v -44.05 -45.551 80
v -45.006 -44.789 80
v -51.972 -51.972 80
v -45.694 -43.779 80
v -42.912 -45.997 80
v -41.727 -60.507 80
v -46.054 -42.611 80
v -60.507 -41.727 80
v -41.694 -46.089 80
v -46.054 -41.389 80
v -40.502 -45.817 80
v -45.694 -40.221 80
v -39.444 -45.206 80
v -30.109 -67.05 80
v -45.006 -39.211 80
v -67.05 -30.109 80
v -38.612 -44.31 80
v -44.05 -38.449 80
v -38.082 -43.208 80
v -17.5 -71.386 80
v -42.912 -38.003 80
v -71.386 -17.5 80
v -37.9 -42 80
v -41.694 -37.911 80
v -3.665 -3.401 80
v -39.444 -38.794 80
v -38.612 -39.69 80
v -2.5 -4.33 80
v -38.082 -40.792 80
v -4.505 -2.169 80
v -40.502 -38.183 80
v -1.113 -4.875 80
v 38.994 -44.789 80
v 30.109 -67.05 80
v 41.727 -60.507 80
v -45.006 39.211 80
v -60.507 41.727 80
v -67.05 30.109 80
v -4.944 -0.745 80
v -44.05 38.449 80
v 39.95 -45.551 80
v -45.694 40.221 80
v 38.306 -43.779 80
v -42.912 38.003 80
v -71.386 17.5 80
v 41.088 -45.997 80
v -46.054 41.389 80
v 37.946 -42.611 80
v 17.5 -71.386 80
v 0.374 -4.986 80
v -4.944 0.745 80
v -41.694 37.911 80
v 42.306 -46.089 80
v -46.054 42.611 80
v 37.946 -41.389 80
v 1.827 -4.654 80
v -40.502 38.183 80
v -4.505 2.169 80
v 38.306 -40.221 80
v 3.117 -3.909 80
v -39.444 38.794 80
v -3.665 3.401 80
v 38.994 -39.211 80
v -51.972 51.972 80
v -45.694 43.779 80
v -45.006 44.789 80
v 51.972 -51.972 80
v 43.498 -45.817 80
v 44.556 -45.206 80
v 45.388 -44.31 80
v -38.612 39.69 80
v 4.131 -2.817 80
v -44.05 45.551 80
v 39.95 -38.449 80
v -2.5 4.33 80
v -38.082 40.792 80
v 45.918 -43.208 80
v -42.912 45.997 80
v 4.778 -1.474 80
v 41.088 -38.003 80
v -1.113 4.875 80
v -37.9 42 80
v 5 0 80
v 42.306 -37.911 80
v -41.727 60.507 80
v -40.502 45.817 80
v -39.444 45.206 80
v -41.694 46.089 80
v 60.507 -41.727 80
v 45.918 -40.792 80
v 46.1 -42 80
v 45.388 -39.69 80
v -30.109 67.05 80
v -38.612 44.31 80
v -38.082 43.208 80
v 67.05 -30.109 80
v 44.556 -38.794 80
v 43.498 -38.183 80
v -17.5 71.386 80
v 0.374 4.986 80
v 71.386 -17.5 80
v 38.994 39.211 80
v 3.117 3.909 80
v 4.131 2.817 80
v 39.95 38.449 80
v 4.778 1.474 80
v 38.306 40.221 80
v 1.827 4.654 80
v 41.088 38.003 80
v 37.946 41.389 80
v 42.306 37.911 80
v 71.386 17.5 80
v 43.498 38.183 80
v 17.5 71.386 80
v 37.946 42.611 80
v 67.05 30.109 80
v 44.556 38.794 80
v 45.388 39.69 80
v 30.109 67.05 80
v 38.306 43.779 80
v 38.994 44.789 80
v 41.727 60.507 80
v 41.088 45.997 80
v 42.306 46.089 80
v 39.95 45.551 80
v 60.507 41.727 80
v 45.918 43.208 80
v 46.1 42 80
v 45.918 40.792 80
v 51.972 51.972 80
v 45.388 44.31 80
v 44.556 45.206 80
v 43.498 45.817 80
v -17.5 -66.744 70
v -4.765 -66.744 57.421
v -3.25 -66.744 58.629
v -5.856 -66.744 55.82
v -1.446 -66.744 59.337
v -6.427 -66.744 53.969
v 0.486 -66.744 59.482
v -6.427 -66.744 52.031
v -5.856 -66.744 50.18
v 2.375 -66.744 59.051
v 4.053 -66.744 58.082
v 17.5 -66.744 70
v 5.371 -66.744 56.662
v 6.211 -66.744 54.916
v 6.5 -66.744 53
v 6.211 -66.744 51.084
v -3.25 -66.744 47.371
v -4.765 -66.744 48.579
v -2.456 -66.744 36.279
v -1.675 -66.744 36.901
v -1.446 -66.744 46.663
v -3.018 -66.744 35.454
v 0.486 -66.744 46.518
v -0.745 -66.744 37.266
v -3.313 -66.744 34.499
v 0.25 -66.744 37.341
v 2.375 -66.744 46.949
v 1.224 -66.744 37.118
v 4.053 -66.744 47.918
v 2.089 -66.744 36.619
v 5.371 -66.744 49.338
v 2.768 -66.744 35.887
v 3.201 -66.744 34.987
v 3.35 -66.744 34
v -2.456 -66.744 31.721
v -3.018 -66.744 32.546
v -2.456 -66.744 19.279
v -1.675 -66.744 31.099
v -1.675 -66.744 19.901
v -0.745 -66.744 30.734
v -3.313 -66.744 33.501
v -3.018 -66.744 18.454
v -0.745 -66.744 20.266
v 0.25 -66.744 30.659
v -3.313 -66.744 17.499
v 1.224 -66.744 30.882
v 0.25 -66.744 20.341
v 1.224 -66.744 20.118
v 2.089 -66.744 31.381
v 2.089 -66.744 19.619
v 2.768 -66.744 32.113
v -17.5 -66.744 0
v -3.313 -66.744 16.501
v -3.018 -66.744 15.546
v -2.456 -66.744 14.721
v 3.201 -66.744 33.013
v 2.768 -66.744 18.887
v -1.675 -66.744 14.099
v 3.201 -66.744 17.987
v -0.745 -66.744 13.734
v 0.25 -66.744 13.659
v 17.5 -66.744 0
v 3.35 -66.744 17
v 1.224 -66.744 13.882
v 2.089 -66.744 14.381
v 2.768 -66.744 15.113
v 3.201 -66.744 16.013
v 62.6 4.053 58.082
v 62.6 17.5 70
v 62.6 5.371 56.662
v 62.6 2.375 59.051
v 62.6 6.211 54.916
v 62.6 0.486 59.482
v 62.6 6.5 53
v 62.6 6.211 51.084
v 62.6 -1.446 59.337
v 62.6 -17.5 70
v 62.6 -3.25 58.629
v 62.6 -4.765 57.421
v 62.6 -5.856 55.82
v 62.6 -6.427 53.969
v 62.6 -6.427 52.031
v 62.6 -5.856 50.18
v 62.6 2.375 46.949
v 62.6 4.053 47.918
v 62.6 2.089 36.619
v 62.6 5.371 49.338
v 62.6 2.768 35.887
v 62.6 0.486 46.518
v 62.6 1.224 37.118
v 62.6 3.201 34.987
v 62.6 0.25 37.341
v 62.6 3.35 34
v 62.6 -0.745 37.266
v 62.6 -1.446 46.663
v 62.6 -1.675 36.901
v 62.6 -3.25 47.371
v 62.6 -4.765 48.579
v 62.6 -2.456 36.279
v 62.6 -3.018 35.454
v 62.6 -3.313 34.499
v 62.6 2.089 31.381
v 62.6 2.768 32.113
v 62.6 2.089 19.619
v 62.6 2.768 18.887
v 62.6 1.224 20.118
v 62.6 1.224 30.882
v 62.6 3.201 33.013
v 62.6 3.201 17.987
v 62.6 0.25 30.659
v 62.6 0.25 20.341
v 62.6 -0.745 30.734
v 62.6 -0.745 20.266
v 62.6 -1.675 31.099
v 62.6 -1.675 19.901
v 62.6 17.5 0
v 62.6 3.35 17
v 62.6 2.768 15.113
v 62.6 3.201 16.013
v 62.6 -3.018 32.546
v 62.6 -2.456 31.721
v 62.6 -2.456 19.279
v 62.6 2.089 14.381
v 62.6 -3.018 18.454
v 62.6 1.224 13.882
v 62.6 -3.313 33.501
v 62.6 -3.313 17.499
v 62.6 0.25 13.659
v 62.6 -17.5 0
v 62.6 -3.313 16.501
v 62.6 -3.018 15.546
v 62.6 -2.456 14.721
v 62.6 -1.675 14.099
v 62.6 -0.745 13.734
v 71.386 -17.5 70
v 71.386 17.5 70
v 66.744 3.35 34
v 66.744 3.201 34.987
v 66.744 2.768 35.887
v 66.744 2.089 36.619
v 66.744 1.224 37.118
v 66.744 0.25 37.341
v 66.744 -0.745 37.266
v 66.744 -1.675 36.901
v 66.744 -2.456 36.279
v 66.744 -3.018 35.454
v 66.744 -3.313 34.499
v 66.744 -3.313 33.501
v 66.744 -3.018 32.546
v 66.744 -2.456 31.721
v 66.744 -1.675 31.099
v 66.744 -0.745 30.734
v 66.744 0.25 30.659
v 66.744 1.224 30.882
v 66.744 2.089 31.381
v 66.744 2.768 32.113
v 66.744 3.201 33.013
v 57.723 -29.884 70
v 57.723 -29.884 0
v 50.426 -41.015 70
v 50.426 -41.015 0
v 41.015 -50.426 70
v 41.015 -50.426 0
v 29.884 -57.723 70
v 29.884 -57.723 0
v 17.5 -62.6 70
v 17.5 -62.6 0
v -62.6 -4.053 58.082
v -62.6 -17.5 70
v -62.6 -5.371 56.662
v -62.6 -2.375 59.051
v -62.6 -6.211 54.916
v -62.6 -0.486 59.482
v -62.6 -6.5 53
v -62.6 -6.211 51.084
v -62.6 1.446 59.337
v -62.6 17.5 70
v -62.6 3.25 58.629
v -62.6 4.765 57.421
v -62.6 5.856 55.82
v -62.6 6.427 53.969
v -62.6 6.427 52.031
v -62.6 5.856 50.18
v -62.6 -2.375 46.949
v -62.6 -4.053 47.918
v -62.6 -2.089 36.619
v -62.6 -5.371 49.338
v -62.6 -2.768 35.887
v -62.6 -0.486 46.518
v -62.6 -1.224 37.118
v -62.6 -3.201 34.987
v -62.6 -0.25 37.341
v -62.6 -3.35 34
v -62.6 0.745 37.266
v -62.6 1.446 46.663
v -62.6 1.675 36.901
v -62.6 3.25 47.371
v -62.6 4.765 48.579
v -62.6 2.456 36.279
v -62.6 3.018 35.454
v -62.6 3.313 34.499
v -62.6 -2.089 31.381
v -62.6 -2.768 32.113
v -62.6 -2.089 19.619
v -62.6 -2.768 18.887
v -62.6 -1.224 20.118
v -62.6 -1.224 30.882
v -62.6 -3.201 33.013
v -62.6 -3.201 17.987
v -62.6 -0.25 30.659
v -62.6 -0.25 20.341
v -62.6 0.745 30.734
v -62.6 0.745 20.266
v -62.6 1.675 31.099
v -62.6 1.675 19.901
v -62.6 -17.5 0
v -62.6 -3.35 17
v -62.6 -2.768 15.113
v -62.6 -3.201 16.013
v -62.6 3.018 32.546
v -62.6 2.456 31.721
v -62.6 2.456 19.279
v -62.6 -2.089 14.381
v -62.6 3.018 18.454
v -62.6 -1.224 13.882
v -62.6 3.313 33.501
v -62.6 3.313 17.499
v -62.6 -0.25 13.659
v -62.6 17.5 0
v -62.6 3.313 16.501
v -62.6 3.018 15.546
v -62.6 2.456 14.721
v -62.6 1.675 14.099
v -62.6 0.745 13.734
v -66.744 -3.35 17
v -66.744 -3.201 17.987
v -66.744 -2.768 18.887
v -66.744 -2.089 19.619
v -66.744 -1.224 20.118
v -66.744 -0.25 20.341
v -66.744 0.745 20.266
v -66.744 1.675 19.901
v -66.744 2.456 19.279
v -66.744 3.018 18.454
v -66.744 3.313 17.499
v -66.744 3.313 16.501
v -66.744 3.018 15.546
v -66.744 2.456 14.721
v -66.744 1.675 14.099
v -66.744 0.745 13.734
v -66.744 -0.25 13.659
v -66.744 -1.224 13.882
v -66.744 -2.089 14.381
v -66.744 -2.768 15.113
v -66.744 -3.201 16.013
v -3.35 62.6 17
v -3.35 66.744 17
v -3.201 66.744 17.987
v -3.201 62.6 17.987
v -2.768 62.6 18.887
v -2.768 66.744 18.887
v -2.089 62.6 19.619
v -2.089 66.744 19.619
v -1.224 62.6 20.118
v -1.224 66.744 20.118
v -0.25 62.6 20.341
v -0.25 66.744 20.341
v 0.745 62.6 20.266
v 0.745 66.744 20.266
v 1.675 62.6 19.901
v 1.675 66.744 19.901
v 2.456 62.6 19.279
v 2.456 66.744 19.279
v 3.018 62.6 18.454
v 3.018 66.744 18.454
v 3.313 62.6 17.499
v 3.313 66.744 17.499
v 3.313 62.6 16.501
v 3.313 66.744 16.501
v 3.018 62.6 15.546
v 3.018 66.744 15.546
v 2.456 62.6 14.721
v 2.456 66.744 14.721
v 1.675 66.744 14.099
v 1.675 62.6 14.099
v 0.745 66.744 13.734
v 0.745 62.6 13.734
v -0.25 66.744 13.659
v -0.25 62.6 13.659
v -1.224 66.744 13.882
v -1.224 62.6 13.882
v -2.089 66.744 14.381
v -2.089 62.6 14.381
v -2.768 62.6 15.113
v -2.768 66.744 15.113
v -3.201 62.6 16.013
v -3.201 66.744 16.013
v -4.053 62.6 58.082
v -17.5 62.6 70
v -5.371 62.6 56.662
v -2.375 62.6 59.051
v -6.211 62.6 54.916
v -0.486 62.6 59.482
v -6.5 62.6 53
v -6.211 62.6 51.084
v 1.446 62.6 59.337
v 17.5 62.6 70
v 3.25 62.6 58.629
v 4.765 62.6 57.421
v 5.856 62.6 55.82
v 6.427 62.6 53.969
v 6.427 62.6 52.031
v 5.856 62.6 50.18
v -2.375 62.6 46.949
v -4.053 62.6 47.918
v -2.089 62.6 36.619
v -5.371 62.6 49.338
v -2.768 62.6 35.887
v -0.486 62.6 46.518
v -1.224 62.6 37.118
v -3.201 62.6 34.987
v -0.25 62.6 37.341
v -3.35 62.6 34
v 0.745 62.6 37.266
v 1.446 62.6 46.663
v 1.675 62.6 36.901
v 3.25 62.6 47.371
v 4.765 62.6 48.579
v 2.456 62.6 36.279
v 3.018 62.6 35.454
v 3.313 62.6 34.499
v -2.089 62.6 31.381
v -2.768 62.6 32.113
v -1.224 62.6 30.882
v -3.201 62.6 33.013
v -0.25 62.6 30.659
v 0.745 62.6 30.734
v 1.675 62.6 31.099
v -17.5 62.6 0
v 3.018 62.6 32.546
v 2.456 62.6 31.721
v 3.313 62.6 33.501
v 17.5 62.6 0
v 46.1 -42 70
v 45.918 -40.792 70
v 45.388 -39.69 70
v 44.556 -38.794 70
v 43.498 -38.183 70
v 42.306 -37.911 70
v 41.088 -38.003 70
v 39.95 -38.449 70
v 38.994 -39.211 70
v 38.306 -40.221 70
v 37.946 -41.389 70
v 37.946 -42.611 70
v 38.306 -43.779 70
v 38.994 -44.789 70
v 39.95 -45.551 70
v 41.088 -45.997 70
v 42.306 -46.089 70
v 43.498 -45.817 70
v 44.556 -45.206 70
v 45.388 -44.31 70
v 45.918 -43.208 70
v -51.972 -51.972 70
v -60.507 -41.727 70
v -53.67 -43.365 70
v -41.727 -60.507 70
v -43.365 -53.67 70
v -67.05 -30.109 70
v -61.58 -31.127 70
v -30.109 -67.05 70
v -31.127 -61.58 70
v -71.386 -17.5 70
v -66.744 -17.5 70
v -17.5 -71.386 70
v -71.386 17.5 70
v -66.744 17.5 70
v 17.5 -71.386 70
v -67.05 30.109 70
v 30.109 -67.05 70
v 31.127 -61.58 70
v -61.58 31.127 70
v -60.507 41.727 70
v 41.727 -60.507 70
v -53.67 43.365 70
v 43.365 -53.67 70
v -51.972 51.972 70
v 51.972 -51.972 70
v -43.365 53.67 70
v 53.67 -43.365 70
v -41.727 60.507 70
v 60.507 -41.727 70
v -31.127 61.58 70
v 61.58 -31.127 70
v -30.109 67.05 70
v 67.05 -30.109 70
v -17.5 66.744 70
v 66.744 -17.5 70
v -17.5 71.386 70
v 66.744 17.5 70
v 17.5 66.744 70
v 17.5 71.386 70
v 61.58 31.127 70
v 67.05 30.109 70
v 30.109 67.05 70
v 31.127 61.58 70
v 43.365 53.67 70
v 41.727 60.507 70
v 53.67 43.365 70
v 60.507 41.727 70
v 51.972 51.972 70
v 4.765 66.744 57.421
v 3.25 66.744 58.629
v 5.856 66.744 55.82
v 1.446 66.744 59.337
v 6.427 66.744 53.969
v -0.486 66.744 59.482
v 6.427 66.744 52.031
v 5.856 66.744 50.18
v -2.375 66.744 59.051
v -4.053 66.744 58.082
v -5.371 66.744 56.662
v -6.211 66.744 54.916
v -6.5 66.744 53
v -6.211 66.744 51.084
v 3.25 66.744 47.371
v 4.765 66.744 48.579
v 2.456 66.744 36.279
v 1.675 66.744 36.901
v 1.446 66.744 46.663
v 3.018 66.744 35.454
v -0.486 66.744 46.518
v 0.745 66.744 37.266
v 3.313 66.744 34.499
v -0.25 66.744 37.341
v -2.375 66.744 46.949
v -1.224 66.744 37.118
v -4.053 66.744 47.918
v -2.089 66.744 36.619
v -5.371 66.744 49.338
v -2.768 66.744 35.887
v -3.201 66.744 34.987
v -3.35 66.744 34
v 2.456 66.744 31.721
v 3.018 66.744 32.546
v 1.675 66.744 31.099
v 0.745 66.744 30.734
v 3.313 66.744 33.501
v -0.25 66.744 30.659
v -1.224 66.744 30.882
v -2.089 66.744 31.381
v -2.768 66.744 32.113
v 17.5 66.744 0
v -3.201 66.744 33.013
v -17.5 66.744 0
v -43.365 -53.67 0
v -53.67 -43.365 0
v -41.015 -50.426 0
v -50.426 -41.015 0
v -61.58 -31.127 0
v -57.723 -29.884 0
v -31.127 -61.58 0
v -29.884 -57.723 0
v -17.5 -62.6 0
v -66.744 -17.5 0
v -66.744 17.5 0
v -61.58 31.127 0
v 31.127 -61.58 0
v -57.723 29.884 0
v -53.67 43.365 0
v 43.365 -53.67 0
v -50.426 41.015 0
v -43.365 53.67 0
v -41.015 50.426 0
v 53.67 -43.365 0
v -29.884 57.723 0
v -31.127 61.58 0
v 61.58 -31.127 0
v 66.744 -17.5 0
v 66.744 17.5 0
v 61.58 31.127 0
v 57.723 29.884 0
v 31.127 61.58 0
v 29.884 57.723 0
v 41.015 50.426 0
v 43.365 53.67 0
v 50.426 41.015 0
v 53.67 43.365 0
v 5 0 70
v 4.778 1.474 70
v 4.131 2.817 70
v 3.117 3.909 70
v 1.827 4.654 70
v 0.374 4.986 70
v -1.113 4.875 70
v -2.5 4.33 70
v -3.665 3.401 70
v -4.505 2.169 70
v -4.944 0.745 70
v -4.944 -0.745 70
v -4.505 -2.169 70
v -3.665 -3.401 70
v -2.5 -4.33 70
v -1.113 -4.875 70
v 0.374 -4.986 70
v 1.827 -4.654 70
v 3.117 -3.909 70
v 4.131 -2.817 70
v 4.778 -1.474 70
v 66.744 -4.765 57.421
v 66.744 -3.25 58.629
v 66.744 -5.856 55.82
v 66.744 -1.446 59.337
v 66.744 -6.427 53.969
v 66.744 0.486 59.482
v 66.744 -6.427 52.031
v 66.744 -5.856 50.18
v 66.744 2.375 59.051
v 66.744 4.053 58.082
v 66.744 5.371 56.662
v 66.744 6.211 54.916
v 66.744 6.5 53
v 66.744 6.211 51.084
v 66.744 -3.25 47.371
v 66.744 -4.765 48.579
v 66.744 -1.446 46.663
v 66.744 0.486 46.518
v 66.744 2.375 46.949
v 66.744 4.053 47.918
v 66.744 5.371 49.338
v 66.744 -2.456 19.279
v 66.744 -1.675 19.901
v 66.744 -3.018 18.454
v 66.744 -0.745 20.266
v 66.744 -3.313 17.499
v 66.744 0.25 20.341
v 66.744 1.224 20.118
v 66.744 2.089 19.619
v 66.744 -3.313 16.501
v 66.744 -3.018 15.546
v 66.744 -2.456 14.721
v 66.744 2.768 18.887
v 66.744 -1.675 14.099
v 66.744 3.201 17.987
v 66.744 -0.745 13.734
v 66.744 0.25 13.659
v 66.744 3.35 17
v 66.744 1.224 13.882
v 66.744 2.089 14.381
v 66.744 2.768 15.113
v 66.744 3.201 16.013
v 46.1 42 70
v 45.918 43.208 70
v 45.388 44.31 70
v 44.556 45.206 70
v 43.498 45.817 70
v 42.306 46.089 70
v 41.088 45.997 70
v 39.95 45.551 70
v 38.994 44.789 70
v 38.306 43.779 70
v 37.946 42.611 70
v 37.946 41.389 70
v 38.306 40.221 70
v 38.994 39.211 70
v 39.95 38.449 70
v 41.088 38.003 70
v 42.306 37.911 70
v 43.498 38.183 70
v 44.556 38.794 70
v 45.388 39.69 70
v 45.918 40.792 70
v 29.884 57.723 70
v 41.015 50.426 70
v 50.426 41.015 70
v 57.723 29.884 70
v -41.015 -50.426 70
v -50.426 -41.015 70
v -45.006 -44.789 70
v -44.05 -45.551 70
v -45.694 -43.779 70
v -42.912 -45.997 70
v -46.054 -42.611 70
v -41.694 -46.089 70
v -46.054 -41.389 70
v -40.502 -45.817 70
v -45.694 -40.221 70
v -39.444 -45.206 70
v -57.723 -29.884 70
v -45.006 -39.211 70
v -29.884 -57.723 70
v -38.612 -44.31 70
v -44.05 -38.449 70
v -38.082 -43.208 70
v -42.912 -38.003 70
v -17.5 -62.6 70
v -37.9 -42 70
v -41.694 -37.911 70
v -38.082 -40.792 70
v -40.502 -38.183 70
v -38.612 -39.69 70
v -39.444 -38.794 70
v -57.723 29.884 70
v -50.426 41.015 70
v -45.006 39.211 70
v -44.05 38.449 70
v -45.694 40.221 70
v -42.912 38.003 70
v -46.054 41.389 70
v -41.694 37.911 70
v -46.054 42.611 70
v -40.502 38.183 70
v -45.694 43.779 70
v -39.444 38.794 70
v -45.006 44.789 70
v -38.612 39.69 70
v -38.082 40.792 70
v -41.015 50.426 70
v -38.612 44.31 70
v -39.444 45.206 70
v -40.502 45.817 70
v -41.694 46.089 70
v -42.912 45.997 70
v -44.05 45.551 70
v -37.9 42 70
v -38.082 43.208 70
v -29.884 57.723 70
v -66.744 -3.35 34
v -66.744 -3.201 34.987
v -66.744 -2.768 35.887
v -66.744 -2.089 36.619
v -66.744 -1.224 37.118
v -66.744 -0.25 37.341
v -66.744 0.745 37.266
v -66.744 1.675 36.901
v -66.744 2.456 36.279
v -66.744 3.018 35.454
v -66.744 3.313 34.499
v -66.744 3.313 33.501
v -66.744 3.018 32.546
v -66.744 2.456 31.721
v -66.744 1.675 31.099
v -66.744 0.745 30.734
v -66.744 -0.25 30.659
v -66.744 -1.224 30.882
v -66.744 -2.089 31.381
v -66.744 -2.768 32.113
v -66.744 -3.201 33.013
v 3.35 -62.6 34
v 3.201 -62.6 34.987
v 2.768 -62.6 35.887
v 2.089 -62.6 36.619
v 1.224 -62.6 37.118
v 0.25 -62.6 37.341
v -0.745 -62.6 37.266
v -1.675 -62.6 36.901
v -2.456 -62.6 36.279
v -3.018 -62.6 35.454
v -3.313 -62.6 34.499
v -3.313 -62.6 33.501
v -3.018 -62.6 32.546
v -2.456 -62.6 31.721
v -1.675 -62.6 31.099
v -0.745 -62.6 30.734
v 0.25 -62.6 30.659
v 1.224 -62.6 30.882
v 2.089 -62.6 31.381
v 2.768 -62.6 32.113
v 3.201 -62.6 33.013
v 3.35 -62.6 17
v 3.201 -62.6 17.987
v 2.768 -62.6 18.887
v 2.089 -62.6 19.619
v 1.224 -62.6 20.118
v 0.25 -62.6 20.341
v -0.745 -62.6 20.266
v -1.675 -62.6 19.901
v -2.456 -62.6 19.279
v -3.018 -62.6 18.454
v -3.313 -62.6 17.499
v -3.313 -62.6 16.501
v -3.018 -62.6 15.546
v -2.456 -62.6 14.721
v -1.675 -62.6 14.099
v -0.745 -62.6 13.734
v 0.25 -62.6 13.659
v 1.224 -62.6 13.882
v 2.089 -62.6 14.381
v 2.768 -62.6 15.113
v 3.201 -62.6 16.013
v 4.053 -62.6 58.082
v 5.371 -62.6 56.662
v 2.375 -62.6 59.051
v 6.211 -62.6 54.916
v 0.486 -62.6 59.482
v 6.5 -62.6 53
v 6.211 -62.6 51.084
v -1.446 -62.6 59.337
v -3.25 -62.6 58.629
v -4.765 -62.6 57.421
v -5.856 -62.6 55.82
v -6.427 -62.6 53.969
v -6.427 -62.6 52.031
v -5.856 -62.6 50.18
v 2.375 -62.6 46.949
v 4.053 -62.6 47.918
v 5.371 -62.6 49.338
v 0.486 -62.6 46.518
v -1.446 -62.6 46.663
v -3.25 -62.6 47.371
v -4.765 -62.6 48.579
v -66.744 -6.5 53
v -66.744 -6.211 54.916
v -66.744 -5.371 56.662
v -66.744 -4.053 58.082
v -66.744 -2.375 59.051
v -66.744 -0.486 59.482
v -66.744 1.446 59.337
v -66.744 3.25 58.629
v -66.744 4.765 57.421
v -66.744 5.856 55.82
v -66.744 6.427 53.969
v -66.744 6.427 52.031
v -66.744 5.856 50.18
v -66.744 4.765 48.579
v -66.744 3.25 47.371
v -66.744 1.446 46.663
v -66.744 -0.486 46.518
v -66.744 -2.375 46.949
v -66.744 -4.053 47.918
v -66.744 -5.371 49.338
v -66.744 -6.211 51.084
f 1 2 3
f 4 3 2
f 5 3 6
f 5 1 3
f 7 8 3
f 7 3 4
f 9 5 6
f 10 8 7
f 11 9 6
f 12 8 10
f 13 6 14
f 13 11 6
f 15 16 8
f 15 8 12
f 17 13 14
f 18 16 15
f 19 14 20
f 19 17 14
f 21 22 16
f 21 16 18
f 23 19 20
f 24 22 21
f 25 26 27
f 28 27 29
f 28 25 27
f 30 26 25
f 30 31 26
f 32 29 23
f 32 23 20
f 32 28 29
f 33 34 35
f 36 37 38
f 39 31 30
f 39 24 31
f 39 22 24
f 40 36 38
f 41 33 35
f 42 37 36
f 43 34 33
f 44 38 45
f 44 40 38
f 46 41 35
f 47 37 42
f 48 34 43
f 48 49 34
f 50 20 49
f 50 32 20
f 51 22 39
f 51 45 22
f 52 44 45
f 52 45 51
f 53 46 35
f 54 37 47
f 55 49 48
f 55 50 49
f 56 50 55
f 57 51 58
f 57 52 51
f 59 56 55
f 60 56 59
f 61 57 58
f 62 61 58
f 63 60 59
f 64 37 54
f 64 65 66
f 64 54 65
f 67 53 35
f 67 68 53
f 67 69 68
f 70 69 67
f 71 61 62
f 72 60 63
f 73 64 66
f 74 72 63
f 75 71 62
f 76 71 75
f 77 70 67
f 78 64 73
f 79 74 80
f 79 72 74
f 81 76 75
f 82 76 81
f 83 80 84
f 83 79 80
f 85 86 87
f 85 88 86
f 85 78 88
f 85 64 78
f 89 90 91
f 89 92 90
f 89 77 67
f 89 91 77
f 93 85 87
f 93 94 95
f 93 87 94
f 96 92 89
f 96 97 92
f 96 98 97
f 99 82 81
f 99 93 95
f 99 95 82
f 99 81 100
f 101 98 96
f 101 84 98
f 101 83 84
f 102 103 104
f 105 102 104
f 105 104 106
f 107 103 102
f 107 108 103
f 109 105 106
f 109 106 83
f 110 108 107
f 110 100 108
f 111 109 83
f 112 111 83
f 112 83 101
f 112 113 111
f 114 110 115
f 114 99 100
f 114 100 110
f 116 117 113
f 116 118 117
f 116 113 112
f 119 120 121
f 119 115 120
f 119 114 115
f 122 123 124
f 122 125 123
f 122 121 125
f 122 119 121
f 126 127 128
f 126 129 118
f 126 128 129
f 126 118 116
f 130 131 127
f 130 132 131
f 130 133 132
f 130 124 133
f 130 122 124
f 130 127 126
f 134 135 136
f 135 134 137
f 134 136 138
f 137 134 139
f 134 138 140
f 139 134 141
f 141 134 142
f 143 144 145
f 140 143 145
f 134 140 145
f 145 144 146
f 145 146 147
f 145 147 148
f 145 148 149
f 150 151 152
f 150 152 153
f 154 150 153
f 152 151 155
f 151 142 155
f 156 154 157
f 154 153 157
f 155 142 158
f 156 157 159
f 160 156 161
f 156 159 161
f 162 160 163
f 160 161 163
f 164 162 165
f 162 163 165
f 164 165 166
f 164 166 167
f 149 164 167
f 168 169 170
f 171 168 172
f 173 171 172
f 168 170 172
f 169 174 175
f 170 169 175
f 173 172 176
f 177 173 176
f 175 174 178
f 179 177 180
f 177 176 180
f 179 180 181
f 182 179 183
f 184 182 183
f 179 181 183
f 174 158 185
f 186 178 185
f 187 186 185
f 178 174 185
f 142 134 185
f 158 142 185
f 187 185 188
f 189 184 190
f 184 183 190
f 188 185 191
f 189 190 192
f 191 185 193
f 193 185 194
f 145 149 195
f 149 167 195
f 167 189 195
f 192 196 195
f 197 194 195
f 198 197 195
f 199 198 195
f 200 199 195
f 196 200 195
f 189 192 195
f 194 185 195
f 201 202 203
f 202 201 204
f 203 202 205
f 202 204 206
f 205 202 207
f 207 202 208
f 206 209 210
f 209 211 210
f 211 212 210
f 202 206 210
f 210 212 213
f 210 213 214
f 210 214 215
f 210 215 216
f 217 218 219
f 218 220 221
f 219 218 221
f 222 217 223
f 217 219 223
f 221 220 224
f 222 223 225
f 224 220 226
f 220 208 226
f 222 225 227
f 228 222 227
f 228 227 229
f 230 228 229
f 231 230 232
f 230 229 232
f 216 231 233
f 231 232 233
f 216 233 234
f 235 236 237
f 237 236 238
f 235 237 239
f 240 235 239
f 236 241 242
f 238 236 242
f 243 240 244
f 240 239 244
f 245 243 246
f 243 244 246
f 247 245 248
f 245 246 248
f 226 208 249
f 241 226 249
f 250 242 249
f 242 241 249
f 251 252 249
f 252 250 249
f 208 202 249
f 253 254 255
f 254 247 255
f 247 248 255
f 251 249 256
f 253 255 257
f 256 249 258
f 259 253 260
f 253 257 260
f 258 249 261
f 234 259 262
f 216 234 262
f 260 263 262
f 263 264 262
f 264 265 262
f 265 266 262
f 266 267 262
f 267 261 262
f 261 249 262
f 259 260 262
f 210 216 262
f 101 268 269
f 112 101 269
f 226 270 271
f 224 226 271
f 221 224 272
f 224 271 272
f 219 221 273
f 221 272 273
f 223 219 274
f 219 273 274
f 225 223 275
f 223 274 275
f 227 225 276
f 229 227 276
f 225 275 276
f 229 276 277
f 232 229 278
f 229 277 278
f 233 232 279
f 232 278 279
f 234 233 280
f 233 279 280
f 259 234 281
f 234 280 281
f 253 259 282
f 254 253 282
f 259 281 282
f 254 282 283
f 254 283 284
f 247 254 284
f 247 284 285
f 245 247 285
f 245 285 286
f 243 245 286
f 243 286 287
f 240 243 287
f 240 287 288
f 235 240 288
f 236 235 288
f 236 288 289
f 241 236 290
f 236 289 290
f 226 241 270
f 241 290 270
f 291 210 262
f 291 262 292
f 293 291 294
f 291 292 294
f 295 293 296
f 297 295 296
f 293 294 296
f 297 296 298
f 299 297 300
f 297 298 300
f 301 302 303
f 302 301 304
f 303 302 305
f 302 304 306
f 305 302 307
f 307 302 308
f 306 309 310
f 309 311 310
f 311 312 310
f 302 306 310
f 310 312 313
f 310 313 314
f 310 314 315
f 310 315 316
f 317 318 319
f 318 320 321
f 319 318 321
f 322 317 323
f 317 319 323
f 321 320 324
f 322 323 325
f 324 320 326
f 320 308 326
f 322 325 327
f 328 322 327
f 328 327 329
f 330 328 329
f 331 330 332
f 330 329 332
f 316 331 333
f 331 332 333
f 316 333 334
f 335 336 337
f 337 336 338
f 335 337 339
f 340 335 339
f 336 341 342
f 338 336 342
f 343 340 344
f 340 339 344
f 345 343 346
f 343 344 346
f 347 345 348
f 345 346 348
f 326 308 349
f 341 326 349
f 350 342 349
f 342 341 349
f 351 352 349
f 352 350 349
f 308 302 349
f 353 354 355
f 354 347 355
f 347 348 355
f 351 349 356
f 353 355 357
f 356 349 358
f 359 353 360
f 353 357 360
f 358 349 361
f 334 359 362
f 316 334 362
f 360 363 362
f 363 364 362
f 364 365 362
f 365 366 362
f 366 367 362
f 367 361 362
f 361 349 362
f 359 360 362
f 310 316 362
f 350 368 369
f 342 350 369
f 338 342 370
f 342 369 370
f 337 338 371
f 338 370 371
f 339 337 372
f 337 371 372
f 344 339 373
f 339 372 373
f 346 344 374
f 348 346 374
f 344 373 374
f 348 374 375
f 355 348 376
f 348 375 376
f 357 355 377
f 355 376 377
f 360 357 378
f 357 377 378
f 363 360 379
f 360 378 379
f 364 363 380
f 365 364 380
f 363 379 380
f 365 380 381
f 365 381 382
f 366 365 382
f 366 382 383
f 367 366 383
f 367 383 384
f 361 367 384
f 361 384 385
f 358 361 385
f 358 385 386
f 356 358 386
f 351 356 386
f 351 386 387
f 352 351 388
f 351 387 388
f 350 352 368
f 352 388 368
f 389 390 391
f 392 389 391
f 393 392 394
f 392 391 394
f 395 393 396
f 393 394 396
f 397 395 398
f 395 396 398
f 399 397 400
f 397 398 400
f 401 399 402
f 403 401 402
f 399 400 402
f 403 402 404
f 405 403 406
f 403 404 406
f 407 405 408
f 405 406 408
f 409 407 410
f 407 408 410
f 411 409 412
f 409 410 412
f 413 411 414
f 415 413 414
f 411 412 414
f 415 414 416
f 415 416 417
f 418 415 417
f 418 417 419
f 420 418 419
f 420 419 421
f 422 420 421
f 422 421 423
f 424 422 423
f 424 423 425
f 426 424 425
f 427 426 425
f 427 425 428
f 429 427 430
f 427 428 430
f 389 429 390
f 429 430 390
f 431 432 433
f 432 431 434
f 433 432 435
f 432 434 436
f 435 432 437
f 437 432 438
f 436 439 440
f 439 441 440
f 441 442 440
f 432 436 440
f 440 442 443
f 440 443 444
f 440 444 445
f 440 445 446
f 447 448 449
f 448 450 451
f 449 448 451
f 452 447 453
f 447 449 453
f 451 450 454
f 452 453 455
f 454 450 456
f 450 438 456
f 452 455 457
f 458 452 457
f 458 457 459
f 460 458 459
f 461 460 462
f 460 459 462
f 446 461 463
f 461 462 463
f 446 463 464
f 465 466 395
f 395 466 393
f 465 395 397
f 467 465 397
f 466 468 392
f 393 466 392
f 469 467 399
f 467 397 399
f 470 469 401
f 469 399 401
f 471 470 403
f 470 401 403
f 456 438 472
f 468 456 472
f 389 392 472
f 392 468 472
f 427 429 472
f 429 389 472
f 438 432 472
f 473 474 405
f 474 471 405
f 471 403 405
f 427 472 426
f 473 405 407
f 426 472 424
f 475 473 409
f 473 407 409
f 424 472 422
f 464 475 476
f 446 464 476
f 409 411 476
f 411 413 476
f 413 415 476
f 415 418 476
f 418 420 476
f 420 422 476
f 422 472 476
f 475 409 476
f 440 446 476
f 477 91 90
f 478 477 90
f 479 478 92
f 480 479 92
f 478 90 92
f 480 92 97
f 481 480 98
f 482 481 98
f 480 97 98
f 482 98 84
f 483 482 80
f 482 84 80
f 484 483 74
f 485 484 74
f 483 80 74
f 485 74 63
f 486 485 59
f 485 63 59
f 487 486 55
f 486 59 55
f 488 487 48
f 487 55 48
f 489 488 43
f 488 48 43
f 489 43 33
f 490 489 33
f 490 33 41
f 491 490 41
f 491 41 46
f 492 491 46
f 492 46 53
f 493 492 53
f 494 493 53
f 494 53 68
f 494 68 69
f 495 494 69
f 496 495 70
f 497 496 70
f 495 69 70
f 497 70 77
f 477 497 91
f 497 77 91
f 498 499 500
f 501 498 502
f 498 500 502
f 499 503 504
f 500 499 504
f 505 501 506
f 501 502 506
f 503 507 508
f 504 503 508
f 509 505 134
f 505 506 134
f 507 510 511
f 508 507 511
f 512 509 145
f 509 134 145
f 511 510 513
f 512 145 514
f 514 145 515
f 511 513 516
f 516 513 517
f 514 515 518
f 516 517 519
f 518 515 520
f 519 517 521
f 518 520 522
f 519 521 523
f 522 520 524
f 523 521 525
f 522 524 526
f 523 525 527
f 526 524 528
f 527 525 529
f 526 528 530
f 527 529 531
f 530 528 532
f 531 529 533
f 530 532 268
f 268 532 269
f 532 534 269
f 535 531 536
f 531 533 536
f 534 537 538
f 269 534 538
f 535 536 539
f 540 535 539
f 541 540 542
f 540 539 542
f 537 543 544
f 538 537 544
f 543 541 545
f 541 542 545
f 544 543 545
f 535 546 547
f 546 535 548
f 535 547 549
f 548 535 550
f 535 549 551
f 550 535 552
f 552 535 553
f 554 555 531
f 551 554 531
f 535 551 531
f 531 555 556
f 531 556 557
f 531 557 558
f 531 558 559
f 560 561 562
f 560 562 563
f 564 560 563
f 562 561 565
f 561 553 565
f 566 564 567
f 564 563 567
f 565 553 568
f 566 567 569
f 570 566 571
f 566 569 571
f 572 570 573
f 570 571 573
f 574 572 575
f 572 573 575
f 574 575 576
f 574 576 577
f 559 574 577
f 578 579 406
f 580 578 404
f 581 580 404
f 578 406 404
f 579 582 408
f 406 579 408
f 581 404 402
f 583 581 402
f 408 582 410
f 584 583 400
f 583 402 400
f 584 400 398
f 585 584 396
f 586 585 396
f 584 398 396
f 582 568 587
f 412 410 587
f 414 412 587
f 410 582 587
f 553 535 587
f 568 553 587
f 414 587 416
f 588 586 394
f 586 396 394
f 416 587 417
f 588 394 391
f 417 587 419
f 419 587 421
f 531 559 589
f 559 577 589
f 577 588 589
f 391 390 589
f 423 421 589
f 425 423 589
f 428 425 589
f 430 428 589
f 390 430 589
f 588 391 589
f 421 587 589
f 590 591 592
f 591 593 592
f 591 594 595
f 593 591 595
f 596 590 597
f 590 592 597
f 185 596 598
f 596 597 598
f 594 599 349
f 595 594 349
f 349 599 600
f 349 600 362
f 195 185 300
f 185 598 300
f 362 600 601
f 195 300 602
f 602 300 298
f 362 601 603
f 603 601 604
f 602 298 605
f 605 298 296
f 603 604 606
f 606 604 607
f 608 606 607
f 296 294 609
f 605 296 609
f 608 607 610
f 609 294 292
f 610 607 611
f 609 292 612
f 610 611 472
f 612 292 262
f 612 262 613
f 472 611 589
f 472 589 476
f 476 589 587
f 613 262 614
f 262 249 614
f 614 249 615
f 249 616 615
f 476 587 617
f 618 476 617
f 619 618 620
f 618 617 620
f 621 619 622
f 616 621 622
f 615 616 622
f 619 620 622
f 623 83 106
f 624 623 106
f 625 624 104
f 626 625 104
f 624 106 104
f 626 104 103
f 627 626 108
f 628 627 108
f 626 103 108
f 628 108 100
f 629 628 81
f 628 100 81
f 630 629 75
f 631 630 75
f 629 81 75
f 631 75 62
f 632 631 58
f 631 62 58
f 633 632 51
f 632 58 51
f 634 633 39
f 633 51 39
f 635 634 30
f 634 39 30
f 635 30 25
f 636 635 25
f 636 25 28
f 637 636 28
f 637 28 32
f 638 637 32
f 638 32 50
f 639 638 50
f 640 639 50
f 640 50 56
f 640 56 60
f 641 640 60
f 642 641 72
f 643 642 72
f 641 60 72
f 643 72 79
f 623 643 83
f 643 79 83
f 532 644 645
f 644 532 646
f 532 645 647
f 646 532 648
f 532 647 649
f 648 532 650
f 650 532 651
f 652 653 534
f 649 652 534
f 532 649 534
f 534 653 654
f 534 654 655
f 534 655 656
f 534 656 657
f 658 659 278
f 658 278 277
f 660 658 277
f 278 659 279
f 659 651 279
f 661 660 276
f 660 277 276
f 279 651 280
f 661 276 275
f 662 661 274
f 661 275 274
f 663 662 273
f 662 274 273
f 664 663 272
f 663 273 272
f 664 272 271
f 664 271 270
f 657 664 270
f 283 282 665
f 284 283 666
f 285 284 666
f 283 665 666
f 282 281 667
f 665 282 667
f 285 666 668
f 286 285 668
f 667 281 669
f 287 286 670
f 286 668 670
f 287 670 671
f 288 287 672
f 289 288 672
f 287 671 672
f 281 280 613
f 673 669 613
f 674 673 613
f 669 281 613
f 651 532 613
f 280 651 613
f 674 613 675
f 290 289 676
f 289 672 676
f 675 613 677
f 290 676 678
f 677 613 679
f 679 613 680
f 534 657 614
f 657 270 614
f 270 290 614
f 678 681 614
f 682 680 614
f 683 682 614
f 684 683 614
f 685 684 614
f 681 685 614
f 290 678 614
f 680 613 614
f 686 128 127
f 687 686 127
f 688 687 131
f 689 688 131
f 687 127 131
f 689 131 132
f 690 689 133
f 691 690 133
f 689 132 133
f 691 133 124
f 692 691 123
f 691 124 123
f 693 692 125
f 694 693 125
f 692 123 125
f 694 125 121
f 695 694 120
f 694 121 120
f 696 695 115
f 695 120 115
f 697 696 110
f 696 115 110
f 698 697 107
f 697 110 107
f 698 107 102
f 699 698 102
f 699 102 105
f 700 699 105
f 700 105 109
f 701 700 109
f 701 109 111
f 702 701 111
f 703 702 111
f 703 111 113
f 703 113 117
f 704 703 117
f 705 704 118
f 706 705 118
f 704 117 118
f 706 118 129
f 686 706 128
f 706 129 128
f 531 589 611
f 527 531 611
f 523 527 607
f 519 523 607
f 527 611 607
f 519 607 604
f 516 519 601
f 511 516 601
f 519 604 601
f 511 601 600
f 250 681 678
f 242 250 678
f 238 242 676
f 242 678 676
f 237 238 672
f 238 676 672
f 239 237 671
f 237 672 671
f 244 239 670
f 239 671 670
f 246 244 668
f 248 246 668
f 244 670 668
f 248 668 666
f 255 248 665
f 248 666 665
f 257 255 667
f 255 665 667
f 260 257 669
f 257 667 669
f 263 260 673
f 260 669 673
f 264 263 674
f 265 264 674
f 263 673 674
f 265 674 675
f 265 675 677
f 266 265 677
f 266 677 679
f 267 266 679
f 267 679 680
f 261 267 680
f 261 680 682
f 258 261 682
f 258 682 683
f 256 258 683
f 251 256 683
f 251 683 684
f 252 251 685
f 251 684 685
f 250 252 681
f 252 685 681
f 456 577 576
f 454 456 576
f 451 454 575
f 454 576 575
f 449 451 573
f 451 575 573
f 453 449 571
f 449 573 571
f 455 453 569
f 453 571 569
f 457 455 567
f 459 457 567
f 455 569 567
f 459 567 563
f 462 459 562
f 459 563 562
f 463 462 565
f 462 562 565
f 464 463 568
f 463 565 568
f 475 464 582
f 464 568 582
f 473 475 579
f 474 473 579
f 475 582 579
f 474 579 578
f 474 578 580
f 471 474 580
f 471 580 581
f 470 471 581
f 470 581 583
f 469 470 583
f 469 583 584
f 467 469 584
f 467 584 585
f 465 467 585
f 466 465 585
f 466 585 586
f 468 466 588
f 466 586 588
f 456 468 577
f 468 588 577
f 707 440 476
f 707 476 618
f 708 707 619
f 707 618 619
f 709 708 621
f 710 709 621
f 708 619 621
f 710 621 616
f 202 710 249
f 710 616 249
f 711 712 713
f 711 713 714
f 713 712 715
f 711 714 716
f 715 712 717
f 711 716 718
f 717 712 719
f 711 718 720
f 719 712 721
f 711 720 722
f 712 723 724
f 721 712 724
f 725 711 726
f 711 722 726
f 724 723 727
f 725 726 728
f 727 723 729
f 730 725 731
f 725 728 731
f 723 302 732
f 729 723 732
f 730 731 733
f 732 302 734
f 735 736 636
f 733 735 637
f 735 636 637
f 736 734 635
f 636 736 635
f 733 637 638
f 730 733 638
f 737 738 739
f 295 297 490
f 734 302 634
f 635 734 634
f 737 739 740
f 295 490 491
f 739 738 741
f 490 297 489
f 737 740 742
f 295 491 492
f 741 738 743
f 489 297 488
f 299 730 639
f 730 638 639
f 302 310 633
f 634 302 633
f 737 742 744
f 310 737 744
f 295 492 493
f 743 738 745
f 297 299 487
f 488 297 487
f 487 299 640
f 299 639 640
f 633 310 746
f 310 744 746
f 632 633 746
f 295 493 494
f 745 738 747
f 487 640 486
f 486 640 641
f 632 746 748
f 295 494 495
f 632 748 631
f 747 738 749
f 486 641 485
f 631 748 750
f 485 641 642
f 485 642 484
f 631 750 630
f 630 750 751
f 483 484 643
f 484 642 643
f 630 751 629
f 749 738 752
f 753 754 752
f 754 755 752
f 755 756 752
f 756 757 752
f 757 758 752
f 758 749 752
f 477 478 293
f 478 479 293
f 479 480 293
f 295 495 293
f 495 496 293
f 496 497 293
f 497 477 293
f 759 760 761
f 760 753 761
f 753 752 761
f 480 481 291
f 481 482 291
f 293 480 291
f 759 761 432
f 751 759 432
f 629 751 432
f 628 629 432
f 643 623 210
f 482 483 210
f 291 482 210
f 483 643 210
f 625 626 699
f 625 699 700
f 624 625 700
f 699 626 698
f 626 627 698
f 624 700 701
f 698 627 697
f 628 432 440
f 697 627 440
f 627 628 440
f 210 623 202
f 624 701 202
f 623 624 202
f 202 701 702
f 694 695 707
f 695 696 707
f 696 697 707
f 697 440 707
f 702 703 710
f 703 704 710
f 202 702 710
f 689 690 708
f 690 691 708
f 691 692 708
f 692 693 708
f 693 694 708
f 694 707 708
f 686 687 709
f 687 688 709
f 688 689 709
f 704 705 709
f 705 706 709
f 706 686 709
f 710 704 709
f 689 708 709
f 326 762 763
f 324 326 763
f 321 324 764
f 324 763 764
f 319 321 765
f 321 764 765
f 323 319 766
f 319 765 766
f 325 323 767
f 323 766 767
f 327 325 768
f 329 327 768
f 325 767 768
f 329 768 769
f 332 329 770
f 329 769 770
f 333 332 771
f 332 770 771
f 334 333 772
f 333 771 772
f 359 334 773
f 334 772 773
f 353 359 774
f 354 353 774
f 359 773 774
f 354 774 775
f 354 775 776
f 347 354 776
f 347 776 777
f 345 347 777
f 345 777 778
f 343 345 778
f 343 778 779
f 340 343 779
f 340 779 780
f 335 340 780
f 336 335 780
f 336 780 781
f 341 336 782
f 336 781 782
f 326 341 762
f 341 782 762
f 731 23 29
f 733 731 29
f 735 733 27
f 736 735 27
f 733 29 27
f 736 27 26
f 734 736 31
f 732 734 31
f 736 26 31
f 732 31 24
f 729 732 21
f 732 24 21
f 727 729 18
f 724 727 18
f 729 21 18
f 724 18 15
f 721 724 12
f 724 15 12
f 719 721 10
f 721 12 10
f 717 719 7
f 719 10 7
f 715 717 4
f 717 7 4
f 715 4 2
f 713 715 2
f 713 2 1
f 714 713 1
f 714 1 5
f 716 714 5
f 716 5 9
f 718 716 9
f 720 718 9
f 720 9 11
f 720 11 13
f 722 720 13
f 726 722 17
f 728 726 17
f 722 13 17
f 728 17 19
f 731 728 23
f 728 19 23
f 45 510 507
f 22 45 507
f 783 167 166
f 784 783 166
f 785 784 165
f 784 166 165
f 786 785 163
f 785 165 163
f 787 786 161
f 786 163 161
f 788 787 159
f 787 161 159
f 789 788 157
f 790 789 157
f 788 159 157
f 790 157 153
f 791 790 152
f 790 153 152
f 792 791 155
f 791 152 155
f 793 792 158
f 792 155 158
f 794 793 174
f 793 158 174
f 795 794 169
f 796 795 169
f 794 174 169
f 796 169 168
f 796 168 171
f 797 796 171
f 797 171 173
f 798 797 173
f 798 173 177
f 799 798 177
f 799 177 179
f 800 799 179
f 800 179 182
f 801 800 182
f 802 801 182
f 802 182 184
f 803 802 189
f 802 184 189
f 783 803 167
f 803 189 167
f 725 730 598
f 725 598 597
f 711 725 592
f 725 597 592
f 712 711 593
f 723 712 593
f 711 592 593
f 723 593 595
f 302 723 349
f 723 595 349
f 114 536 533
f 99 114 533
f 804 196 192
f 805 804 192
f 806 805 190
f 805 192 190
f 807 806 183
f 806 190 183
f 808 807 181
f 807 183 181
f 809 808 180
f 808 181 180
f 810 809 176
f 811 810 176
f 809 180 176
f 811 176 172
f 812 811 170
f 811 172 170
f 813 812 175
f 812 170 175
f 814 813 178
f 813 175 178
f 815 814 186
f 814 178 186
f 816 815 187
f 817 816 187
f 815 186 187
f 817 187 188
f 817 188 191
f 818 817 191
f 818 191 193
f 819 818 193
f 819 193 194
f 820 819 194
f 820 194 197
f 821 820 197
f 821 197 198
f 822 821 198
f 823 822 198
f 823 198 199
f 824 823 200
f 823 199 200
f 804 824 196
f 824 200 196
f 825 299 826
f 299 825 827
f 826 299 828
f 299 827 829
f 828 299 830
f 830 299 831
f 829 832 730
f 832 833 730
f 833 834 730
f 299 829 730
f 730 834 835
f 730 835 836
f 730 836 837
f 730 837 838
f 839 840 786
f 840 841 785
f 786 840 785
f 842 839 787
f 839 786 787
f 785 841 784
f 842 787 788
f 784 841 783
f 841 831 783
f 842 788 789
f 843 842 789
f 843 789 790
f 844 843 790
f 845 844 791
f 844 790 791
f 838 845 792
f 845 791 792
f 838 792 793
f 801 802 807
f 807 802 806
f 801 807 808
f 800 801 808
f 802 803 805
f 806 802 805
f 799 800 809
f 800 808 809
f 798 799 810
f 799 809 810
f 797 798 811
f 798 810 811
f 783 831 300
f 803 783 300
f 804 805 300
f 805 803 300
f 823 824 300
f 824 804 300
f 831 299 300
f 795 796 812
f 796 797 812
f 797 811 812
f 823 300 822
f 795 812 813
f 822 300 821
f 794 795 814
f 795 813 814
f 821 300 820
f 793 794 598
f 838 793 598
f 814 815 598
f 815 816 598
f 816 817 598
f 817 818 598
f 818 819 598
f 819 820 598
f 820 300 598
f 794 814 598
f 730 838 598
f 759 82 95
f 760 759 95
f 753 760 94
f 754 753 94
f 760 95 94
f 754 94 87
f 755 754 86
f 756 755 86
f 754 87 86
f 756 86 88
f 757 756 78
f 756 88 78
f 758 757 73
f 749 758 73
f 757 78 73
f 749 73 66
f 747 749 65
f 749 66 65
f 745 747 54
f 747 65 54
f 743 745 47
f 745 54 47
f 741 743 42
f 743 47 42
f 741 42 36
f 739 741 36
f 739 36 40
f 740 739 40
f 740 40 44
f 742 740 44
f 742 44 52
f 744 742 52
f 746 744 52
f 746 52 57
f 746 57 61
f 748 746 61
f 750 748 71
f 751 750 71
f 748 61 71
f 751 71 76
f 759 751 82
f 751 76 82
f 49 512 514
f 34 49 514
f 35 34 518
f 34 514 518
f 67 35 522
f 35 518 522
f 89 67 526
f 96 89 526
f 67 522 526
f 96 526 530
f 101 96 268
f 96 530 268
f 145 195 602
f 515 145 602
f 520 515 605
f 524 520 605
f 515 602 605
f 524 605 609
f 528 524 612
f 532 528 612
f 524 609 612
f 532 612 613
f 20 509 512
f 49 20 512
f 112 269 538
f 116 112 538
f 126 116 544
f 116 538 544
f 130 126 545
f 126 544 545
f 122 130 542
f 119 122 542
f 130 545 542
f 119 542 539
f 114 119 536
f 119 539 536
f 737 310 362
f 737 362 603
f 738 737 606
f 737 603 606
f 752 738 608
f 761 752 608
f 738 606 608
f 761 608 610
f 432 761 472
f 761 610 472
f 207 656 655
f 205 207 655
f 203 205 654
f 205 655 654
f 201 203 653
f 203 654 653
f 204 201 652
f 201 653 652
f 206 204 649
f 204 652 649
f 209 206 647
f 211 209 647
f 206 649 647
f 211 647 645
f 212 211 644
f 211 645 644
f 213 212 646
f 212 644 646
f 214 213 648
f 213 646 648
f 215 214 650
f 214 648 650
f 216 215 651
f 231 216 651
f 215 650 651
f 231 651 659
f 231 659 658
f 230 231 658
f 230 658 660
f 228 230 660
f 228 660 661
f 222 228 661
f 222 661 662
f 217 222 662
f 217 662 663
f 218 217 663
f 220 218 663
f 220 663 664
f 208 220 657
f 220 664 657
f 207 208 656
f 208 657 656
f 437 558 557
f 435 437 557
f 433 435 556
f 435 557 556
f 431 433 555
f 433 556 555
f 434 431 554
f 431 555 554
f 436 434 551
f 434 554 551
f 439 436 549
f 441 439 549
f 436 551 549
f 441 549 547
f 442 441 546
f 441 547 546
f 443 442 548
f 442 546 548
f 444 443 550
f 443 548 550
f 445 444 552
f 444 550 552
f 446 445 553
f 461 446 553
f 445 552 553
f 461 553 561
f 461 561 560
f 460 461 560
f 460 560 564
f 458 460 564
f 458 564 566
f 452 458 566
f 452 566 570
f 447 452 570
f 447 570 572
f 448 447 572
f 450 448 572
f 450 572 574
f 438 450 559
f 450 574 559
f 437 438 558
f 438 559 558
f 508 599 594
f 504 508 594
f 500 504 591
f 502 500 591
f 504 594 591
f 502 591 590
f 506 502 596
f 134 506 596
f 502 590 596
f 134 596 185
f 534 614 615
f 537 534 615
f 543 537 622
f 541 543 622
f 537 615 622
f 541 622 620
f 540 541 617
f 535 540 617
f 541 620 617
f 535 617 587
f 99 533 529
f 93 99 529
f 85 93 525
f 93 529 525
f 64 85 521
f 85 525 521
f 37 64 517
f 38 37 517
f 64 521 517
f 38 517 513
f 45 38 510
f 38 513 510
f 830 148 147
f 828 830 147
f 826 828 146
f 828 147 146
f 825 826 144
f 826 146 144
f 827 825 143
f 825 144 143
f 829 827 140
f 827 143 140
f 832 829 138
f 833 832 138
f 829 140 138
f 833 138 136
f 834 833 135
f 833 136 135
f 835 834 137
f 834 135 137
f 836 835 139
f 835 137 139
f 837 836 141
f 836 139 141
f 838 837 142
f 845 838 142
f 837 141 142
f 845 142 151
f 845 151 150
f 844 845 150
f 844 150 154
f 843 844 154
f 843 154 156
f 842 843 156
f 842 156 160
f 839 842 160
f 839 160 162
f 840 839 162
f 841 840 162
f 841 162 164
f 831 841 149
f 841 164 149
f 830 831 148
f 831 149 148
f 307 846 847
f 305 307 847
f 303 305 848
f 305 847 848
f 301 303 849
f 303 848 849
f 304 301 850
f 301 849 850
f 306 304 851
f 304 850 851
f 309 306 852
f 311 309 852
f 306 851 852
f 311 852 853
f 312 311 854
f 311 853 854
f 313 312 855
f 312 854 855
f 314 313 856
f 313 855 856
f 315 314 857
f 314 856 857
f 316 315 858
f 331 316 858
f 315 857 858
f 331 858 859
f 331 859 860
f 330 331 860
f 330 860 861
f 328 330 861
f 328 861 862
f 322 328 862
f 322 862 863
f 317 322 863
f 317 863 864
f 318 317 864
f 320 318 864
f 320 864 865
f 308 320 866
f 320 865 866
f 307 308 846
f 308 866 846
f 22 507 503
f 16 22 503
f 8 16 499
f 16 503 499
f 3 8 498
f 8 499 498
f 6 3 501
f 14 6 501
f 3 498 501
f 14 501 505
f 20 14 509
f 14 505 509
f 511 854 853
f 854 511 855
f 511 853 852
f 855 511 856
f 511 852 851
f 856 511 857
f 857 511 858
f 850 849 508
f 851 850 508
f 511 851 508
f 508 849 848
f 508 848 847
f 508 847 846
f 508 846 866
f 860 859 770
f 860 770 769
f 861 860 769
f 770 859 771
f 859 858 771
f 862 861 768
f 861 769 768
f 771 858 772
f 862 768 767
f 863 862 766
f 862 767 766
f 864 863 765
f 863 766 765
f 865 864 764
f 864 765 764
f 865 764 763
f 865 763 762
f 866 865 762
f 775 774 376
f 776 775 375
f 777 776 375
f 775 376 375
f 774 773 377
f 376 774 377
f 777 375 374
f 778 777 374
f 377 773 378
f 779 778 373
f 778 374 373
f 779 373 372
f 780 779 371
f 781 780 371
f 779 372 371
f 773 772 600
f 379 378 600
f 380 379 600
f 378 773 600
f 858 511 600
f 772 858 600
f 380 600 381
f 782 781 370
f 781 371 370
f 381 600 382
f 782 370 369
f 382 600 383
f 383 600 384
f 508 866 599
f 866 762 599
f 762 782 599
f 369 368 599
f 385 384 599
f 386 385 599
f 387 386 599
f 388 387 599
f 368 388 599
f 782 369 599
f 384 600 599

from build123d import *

# Parameters (mm, degrees)
F1_DEPTH  = 70
F3_DEPTH  = 10
F4_R      = 6.5
F4_R_2    = 3.35
F5_DEPTH  = 4.1439934524
F6_R      = 6.5
F6_R_2    = 3.35
F7_DEPTH  = 4.1439934524
F8_R      = 6.5
F8_R_2    = 3.35
F9_DEPTH  = 4.1439934524
F10_R     = 6.5
F10_R_2   = 3.35
F11_DEPTH = 4.1439934524
F12_R     = 5
F12_R_2   = 4.1
F13_DEPTH = 10


with BuildPart() as f1:
    # F0 (on Top) → F1 (new body)
    with BuildSketch(Plane.XY):
        with BuildLine():
            Line((17.5, 66.7439135802), (-17.5, 66.7439135802))
            ThreePointArc((-17.5, 66.7439135802), (-48.7903679019, 48.7903679019), (-66.7439135802, 17.5))
            Line((-66.7439135802, 17.5), (-66.7439135802, -17.5))
            ThreePointArc((-66.7439135802, -17.5), (-48.7903679019, -48.7903679019), (-17.5, -66.7439135802))
            Line((-17.5, -66.7439135802), (17.5, -66.7439135802))
            ThreePointArc((17.5, -66.7439135802), (48.7903679019, -48.7903679019), (66.7439135802, -17.5))
            Line((66.7439135802, -17.5), (66.7439135802, 17.5))
            ThreePointArc((66.7439135802, 17.5), (48.7903679019, 48.7903679019), (17.5, 66.7439135802))
        make_face()
        with BuildLine():
            ThreePointArc((-62.5999201277, 17.5), (-45.9619407771, 45.9619407771), (-17.5, 62.5999201277))
            Line((-17.5, 62.5999201277), (17.5, 62.5999201277))
            ThreePointArc((17.5, 62.5999201277), (45.9619407771, 45.9619407771), (62.5999201277, 17.5))
            Line((62.5999201277, 17.5), (62.5999201277, -17.5))
            ThreePointArc((62.5999201277, -17.5), (45.9619407771, -45.9619407771), (17.5, -62.5999201277))
            Line((17.5, -62.5999201277), (-17.5, -62.5999201277))
            ThreePointArc((-17.5, -62.5999201277), (-45.9619407771, -45.9619407771), (-62.5999201277, -17.5))
            Line((-62.5999201277, -17.5), (-62.5999201277, 17.5))
        make_face(mode=Mode.SUBTRACT)
    extrude(amount=F1_DEPTH)

    # F2 (on face) → F3 (join)
    with BuildSketch(Plane.XY.offset(70)):
        with BuildLine():
            Line((17.5, 71.3862731903), (-17.5, 71.3862731903))
            ThreePointArc((-17.5, 71.3862731903), (-51.9723484172, 51.9723484172), (-71.3862731903, 17.5))
            Line((-71.3862731903, 17.5), (-71.3862731903, -17.5))
            ThreePointArc((-71.3862731903, -17.5), (-51.9723484172, -51.9723484172), (-17.5, -71.3862731903))
            Line((-17.5, -71.3862731903), (17.5, -71.3862731903))
            ThreePointArc((17.5, -71.3862731903), (51.9723484172, -51.9723484172), (71.3862731903, -17.5))
            Line((71.3862731903, -17.5), (71.3862731903, 17.5))
            ThreePointArc((71.3862731903, 17.5), (51.9723484172, 51.9723484172), (17.5, 71.3862731903))
        make_face()
    extrude(amount=F3_DEPTH)

    # F4 (on face) → F5 (cut, through all)
    with BuildSketch(Plane.XZ.offset(66.7439135802)):
        with Locations((0, 53)):
            Circle(F4_R)
        with Locations((0, 34)):
            Circle(F4_R_2)
        with Locations((0, 17)):
            Circle(F4_R_2)
    extrude(amount=-F5_DEPTH, mode=Mode.SUBTRACT)

    # F6 (on face) → F7 (cut, through all)
    with BuildSketch(Plane.YZ.offset(66.7439135802)):
        with Locations((0, 53)):
            Circle(F6_R)
        with Locations((0, 34)):
            Circle(F6_R_2)
        with Locations((0, 17)):
            Circle(F6_R_2)
    extrude(amount=-F7_DEPTH, mode=Mode.SUBTRACT)

    # F8 (on face) → F9 (cut, through all)
    with BuildSketch(Plane(origin=(0, 66.7439135802, 0), x_dir=(-1, 0, 0), z_dir=(0, 1, 0))):
        with Locations((0, 53)):
            Circle(F8_R)
        with Locations((0, 34)):
            Circle(F8_R_2)
        with Locations((0, 17)):
            Circle(F8_R_2)
    extrude(amount=-F9_DEPTH, mode=Mode.SUBTRACT)

    # F10 (on face) → F11 (cut, through all)
    with BuildSketch(Plane(origin=(-66.7439135802, 0, 0), x_dir=(0, -1, 0), z_dir=(-1, 0, 0))):
        with Locations((0, 53)):
            Circle(F10_R)
        with Locations((0, 34)):
            Circle(F10_R_2)
        with Locations((0, 17)):
            Circle(F10_R_2)
    extrude(amount=-F11_DEPTH, mode=Mode.SUBTRACT)

    # F12 (on face) → F13 (cut, through all)
    with BuildSketch(Plane.XY.offset(80)):
        Circle(F12_R)
        with Locations((-42, 42)):
            Circle(F12_R_2)
        with Locations((42, 42)):
            Circle(F12_R_2)
        with Locations((42, -42)):
            Circle(F12_R_2)
        with Locations((-42, -42)):
            Circle(F12_R_2)
    extrude(amount=-F13_DEPTH, mode=Mode.SUBTRACT)


solid = f1.part
